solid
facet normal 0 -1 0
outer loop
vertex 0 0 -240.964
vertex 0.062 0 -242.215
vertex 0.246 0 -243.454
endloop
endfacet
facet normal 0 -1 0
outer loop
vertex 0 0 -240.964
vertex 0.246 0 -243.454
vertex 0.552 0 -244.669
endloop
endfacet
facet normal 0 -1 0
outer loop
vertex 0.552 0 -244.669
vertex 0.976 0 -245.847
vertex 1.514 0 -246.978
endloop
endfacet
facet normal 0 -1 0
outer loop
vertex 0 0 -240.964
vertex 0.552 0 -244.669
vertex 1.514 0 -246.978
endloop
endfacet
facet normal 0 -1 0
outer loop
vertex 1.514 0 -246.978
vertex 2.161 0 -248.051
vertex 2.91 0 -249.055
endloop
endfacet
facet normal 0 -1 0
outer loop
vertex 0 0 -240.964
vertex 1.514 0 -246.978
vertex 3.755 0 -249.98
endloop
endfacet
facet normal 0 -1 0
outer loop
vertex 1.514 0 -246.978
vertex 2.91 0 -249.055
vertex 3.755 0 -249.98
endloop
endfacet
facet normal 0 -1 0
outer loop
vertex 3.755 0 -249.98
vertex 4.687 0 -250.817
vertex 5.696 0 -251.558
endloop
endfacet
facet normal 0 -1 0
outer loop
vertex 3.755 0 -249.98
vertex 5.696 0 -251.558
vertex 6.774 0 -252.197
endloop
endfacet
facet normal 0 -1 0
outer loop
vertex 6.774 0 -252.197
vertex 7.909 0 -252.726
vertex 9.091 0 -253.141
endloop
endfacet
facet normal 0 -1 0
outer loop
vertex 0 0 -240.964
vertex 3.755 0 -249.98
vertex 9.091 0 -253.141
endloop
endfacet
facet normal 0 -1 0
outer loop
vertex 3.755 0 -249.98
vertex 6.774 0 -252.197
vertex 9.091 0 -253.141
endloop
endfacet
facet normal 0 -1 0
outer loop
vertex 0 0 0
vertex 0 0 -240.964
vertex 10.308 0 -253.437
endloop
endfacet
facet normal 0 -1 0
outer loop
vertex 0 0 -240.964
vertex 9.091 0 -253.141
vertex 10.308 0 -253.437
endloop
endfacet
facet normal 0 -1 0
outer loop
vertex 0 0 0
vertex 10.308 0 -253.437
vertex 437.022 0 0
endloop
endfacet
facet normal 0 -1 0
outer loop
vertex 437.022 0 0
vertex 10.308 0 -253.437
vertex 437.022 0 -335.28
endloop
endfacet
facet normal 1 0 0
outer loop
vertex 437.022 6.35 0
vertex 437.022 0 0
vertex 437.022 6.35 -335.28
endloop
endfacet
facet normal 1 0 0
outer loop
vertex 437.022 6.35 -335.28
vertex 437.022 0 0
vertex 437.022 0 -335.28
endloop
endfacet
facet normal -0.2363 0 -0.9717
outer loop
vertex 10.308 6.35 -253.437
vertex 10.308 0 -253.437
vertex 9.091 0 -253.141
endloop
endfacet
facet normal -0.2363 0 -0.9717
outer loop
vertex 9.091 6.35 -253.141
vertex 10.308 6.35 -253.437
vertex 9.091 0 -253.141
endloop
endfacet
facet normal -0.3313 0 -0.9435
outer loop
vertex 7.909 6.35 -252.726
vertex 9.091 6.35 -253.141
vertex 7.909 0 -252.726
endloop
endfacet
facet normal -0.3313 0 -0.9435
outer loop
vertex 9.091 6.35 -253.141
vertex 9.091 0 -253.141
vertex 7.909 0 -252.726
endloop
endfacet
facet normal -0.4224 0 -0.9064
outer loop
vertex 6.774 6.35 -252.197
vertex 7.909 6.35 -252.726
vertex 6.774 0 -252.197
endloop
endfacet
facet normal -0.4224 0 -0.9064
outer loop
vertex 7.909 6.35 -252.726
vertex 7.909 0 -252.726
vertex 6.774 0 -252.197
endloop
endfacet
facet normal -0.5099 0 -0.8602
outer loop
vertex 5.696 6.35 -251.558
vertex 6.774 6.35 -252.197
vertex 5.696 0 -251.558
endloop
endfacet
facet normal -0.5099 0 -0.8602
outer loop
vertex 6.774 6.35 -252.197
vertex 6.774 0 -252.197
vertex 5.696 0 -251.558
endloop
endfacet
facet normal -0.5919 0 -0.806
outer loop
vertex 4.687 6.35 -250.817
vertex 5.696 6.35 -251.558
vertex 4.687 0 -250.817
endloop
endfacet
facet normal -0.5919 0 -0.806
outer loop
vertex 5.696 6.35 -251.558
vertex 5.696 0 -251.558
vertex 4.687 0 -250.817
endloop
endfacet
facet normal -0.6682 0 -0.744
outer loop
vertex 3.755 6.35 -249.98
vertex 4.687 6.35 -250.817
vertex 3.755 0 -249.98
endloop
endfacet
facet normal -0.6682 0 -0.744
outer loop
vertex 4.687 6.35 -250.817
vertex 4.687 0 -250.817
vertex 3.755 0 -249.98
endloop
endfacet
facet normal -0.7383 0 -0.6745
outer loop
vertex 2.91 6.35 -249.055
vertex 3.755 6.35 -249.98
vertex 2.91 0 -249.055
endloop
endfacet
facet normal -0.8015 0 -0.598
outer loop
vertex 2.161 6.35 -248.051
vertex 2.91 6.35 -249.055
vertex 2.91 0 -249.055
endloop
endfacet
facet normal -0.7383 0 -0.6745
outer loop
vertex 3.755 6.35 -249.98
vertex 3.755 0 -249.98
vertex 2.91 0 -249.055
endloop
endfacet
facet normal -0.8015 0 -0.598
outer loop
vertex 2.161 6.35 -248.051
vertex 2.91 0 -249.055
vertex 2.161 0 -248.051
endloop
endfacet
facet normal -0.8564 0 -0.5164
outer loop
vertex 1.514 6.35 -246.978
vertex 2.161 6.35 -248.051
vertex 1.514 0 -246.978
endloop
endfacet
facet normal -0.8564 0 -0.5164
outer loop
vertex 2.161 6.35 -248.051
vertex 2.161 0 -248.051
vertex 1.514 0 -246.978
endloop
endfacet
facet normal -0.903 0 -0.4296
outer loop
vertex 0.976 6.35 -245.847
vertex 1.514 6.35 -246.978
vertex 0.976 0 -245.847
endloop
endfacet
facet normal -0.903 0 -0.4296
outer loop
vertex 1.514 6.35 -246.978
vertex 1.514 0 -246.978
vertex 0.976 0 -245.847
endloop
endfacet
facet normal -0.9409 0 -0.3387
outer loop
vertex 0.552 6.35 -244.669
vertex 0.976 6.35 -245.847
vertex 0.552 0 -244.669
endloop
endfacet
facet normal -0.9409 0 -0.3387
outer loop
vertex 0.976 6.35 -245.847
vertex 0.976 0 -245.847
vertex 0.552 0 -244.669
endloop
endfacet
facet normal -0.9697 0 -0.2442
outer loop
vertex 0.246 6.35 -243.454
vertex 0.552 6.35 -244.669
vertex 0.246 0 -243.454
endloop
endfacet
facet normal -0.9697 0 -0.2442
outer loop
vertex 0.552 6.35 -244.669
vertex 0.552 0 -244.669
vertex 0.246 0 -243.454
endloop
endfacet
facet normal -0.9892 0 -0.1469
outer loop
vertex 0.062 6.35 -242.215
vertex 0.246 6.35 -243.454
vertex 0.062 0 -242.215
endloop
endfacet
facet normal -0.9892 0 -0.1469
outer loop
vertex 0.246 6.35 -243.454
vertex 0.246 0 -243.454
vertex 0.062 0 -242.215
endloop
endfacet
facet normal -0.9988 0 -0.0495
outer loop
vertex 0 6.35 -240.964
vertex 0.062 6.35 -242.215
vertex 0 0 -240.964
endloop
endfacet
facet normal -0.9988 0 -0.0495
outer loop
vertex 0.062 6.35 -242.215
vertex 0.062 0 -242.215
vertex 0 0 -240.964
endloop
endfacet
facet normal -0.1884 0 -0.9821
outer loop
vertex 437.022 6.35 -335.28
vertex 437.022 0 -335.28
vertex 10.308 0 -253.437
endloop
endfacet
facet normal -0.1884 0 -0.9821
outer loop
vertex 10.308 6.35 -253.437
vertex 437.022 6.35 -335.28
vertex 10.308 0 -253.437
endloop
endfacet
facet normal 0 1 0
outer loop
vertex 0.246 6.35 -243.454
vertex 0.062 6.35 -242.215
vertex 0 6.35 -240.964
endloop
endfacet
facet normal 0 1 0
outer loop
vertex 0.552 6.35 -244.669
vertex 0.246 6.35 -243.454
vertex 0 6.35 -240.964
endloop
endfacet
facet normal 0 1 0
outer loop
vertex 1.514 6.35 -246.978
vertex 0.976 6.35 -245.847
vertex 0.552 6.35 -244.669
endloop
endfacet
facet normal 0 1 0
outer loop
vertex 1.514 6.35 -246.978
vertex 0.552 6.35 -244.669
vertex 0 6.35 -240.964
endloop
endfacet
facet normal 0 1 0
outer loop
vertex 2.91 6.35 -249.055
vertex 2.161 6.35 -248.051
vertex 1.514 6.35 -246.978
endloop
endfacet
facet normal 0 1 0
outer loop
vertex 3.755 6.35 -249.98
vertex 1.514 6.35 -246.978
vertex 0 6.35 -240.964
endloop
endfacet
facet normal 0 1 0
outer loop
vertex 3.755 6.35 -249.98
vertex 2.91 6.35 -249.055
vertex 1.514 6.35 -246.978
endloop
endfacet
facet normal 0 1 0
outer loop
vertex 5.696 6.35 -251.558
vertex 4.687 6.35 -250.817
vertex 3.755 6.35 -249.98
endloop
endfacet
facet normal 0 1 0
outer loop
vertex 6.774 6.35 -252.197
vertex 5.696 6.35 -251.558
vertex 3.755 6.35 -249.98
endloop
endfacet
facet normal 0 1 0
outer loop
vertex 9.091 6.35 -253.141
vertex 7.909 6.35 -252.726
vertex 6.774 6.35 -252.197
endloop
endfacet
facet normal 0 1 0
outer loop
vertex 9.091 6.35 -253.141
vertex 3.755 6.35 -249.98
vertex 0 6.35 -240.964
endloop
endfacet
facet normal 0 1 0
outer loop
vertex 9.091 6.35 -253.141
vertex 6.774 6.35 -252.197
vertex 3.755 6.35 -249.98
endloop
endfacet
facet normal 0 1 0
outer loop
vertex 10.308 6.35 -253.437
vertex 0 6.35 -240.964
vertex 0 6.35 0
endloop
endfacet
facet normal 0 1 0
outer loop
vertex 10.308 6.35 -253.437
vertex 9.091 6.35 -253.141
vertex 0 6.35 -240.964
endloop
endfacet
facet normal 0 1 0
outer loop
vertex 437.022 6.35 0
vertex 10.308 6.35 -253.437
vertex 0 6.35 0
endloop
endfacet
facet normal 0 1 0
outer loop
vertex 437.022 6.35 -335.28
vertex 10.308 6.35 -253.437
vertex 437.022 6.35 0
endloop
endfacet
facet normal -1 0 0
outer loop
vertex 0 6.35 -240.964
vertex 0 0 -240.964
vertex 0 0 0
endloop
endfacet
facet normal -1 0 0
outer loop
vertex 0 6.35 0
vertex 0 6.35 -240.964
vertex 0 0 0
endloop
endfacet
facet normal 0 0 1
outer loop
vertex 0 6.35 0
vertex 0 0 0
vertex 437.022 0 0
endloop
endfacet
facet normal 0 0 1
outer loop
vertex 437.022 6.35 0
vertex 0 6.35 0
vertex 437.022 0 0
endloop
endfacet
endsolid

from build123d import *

# Parameters (mm, degrees)
BOSS_EXTRUDE1_DEPTH = 6.35


with BuildPart() as part:
    # Sketch1 → Boss-Extrude1 (new body)
    with BuildSketch(Plane(origin=(0, 0, 0), x_dir=(1, 0, 0), z_dir=(0, 1, 0))):
        with BuildLine():
            Line((0, 0), (437.02224, 0))
            Line((437.02224, 0), (437.02224, 335.28))
            Line((437.02224, 335.28), (10.307768658, 253.437009611))
            ThreePointArc((10.307768658, 253.437009611), (2.910430601, 249.054735438), (0, 240.964350344))
            Line((0, 240.964350344), (0, 0))
        make_face()
    extrude(amount=BOSS_EXTRUDE1_DEPTH)


solid = part.part
